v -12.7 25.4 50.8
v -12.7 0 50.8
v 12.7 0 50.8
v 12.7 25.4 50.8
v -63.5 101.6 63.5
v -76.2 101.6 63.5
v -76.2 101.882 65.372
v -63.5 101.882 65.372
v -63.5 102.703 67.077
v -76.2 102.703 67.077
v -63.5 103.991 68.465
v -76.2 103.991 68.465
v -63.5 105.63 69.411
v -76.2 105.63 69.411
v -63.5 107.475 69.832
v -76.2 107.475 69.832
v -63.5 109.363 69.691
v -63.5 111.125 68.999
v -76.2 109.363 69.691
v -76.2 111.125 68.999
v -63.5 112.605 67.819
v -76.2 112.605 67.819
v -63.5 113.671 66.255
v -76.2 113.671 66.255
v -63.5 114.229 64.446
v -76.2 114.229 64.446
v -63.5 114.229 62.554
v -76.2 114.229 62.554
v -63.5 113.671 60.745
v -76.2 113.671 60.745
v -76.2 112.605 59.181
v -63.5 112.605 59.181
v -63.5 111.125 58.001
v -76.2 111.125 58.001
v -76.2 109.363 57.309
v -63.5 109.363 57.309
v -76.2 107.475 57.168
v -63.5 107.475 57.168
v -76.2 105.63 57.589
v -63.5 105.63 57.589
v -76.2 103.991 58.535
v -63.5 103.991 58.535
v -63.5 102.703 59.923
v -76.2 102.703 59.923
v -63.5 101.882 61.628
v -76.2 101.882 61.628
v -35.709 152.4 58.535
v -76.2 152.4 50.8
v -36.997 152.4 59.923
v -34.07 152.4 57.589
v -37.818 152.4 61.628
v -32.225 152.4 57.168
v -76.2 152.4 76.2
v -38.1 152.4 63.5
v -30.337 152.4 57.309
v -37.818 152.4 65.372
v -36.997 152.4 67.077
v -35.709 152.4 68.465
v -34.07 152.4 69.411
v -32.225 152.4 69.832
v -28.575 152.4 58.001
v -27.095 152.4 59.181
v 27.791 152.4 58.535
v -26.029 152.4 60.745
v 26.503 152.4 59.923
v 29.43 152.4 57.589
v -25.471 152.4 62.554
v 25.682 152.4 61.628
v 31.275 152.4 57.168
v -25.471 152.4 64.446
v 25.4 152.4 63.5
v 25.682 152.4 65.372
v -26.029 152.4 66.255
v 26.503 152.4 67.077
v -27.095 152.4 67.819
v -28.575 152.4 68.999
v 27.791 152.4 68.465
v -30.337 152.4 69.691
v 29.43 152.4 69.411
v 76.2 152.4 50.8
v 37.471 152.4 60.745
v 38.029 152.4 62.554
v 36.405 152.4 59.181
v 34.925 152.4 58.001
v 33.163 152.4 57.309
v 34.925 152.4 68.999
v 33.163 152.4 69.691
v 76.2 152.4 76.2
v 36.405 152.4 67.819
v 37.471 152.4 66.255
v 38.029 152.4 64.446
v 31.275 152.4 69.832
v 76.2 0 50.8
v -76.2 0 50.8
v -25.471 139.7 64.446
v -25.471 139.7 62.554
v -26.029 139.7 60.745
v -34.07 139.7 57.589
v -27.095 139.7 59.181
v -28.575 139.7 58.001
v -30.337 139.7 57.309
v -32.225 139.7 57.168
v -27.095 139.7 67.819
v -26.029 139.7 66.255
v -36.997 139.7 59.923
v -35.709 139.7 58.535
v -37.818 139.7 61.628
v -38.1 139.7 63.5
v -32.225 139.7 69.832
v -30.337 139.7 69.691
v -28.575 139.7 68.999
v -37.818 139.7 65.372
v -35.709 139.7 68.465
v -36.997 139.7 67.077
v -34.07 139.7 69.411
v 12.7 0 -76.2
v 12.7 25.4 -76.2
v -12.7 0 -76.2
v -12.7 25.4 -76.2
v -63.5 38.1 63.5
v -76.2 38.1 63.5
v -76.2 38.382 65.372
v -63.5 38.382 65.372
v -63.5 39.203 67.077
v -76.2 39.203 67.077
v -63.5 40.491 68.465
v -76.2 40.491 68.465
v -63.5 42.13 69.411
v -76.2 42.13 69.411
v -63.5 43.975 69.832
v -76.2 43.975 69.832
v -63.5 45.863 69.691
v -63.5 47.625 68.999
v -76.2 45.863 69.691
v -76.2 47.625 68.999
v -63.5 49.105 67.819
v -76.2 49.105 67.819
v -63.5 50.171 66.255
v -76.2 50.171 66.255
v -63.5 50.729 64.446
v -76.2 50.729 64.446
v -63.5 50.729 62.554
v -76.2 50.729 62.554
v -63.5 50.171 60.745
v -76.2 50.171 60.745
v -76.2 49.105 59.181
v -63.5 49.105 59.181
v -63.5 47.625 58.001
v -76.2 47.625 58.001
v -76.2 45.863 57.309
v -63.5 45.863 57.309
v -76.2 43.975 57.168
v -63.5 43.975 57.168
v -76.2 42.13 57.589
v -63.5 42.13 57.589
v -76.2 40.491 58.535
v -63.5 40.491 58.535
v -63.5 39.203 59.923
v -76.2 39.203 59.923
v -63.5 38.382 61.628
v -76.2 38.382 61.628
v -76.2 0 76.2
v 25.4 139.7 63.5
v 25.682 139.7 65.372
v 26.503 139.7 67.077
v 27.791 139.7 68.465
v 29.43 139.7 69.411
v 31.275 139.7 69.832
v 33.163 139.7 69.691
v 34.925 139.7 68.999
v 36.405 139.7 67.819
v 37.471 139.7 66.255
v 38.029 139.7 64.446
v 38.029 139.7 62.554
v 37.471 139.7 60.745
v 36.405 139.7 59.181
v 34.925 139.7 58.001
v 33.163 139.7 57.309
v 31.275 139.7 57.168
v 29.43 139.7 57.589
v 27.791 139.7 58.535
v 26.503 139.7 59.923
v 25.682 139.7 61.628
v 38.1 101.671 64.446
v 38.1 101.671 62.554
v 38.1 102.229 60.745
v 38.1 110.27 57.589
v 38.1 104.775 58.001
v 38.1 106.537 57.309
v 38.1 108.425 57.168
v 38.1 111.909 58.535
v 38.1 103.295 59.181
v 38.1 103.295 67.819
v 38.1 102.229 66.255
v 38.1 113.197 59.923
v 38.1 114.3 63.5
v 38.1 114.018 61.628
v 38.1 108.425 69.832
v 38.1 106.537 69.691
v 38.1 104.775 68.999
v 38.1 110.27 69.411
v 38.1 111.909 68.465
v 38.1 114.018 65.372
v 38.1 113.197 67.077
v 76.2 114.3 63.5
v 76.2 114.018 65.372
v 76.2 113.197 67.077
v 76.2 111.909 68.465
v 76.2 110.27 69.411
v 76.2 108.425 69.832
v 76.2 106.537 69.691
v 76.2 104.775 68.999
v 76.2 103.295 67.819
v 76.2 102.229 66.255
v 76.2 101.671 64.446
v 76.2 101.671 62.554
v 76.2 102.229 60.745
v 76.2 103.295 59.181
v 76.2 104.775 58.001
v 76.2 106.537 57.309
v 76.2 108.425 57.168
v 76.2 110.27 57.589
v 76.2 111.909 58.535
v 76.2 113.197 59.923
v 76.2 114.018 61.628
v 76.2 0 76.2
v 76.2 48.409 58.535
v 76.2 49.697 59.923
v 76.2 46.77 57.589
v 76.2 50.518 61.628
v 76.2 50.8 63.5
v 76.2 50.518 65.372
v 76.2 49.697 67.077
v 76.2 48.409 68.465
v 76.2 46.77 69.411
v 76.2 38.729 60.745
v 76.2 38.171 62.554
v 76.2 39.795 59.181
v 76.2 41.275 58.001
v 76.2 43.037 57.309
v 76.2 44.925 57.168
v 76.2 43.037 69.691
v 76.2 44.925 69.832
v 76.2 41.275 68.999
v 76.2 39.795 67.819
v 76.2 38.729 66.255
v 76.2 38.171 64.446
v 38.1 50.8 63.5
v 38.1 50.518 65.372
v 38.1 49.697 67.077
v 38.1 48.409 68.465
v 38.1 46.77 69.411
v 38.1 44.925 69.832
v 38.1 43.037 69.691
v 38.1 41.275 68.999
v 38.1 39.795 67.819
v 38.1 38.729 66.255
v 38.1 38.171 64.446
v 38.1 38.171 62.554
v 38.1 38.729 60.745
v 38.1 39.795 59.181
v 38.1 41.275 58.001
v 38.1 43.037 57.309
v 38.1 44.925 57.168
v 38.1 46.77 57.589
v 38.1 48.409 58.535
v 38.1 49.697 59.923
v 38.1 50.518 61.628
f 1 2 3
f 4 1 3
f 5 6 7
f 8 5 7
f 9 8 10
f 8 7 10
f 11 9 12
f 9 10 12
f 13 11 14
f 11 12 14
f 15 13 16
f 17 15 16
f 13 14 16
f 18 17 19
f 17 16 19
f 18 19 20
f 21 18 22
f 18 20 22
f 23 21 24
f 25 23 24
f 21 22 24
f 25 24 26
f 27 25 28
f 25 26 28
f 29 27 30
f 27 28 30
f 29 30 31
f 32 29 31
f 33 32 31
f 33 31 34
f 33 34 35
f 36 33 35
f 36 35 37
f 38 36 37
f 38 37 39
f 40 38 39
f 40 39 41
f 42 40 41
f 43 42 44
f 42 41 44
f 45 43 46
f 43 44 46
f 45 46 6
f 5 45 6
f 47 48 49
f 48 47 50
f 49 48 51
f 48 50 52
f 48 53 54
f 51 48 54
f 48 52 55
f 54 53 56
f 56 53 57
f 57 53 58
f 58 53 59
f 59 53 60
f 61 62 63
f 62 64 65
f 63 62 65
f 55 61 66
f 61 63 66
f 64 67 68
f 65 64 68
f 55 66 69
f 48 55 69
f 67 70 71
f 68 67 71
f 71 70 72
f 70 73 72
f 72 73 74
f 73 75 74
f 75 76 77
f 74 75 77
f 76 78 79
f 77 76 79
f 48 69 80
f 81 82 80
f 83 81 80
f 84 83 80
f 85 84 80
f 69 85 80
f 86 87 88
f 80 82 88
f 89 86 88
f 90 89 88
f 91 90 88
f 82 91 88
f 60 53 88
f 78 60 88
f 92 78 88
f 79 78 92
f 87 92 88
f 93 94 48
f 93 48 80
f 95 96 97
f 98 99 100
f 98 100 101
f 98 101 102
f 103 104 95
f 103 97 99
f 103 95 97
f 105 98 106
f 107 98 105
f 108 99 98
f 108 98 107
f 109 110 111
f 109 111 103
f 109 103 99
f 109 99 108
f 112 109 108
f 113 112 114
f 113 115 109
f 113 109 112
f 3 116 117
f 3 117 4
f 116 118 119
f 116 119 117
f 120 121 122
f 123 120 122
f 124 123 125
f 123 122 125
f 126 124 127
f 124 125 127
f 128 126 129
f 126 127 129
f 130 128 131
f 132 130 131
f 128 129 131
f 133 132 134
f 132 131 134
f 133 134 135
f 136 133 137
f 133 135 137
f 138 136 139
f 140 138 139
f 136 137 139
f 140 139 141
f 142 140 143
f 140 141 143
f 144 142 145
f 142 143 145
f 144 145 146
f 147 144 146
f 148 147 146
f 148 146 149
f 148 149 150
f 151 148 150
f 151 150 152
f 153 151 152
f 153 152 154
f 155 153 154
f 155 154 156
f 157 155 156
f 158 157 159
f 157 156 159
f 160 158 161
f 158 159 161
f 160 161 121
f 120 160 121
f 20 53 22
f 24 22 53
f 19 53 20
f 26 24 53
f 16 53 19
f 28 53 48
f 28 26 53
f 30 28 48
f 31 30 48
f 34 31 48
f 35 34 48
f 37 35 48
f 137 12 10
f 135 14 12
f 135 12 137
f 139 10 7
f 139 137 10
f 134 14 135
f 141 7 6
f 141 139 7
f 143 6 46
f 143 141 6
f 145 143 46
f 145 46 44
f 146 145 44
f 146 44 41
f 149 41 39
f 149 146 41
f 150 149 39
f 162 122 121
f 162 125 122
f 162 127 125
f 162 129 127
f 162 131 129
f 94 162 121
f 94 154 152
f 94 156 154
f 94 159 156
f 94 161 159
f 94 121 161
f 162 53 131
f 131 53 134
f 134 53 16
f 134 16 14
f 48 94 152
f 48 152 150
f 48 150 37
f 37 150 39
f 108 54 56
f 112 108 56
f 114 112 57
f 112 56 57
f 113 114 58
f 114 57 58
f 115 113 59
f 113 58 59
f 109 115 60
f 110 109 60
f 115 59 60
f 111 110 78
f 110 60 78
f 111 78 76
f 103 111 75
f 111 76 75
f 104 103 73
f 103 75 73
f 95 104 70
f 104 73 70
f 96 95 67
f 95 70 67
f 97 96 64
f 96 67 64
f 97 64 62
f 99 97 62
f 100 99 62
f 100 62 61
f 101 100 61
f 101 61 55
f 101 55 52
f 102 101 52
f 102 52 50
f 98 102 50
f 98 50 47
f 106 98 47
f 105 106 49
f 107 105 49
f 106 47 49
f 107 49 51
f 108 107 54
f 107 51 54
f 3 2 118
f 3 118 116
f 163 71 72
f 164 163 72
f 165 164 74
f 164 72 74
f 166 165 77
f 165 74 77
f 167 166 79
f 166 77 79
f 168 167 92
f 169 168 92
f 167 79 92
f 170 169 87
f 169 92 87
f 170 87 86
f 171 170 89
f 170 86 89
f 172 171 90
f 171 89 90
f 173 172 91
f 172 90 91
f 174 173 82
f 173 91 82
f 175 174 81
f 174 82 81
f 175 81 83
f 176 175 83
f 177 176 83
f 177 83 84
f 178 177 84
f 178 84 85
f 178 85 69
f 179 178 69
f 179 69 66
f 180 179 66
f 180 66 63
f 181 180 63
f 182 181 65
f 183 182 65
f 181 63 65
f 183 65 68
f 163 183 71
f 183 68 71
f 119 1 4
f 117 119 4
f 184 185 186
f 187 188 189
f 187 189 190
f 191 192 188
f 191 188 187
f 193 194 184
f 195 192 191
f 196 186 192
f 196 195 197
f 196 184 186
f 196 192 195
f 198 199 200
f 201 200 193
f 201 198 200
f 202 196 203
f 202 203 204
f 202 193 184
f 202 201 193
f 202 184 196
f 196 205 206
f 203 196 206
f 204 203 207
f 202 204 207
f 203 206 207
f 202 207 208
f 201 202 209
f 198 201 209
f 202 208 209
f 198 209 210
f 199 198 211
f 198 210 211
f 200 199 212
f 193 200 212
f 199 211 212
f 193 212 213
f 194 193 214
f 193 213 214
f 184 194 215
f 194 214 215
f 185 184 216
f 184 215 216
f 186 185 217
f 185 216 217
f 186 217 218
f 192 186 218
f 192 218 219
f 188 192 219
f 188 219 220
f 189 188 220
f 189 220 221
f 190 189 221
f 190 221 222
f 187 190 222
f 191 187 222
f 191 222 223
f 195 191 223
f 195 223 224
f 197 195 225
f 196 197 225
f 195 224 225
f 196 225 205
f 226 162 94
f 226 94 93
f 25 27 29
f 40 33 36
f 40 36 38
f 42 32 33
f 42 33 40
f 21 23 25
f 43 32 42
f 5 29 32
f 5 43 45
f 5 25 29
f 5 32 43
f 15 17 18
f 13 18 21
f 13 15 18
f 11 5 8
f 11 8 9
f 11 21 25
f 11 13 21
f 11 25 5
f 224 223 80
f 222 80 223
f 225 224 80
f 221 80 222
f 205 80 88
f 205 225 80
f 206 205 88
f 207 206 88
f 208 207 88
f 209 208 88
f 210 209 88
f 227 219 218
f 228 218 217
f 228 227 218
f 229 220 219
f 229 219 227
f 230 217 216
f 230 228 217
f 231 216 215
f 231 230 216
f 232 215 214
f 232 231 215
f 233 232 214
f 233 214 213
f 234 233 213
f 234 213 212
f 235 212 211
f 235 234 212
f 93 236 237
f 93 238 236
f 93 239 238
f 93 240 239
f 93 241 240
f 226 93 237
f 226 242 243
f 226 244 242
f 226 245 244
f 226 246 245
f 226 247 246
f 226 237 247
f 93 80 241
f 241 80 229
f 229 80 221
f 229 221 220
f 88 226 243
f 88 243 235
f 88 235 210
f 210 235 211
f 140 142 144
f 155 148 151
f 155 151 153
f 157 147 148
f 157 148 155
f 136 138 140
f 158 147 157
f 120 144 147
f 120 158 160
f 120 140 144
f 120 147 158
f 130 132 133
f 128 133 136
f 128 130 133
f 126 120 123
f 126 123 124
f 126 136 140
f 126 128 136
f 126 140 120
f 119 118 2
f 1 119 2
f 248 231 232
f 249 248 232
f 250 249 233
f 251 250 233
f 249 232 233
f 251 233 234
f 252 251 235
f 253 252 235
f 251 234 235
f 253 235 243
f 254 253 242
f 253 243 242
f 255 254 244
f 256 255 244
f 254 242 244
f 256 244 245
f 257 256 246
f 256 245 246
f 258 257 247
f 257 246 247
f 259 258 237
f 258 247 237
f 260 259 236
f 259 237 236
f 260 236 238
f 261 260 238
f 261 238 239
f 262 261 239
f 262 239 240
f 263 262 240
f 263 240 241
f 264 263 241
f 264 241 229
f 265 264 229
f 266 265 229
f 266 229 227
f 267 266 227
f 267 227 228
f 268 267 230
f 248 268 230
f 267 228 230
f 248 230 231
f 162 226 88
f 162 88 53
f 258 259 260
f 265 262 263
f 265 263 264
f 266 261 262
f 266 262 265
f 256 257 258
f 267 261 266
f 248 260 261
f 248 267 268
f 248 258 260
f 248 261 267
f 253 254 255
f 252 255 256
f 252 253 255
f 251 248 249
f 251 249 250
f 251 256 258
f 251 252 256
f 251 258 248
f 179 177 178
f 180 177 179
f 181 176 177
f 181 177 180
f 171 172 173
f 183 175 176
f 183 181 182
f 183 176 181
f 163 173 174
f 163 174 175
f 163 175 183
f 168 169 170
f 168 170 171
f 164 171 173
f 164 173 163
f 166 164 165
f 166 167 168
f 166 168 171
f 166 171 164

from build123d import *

# Parameters (mm, degrees)
F1_DEPTH = 152.400002
F0_W     = 25.4
F0_H     = 127
F2_DEPTH = 25.4
F3_R     = 6.35
F4_DEPTH = 12.7
F5_R     = 6.35
F6_DEPTH = 12.7
F7_R     = 6.35
F8_DEPTH = 38.1


with BuildPart() as f1:
    # F0 (on Front) → F1 (new body)
    with BuildSketch(Plane.XZ):
        Polygon((12.7, 76.2), (-12.7, 76.2), (-76.2, 76.2), (-76.2, 50.8), (-12.7, 50.8), (12.7, 50.8), (76.2, 50.8), (76.2, 76.2), align=None)
    extrude(amount=-F1_DEPTH)

    # F3 (on face) → F4 (cut)
    with BuildSketch(Plane(origin=(-76.2, 0, 0), x_dir=(0, -1, 0), z_dir=(-1, 0, 0))):
        with Locations((-107.950002, 63.5)):
            Circle(F3_R)
        with Locations((-44.45, 63.5)):
            Circle(F3_R)
    extrude(amount=-F4_DEPTH, mode=Mode.SUBTRACT)

    # F5 (on face) → F6 (cut)
    with BuildSketch(Plane(origin=(0, 152.400002, 0), x_dir=(-1, 0, 0), z_dir=(0, 1, 0))):
        with Locations((-31.75, 63.5)):
            Circle(F5_R)
        with Locations((31.75, 63.5)):
            Circle(F5_R)
    extrude(amount=-F6_DEPTH, mode=Mode.SUBTRACT)

    # F7 (on face) → F8 (cut)
    with BuildSketch(Plane.YZ.offset(76.2)):
        with Locations((44.45, 63.5)):
            Circle(F7_R)
        with Locations((107.950002, 63.5)):
            Circle(F7_R)
    extrude(amount=-F8_DEPTH, mode=Mode.SUBTRACT)


with BuildPart() as f2:
    # F0 (on Front) → F2 (new body)
    with BuildSketch(Plane.XZ):
        with Locations((0, -12.7)):
            Rectangle(F0_W, F0_H)
    extrude(amount=-F2_DEPTH)


solid = Compound([f1.part, f2.part])
